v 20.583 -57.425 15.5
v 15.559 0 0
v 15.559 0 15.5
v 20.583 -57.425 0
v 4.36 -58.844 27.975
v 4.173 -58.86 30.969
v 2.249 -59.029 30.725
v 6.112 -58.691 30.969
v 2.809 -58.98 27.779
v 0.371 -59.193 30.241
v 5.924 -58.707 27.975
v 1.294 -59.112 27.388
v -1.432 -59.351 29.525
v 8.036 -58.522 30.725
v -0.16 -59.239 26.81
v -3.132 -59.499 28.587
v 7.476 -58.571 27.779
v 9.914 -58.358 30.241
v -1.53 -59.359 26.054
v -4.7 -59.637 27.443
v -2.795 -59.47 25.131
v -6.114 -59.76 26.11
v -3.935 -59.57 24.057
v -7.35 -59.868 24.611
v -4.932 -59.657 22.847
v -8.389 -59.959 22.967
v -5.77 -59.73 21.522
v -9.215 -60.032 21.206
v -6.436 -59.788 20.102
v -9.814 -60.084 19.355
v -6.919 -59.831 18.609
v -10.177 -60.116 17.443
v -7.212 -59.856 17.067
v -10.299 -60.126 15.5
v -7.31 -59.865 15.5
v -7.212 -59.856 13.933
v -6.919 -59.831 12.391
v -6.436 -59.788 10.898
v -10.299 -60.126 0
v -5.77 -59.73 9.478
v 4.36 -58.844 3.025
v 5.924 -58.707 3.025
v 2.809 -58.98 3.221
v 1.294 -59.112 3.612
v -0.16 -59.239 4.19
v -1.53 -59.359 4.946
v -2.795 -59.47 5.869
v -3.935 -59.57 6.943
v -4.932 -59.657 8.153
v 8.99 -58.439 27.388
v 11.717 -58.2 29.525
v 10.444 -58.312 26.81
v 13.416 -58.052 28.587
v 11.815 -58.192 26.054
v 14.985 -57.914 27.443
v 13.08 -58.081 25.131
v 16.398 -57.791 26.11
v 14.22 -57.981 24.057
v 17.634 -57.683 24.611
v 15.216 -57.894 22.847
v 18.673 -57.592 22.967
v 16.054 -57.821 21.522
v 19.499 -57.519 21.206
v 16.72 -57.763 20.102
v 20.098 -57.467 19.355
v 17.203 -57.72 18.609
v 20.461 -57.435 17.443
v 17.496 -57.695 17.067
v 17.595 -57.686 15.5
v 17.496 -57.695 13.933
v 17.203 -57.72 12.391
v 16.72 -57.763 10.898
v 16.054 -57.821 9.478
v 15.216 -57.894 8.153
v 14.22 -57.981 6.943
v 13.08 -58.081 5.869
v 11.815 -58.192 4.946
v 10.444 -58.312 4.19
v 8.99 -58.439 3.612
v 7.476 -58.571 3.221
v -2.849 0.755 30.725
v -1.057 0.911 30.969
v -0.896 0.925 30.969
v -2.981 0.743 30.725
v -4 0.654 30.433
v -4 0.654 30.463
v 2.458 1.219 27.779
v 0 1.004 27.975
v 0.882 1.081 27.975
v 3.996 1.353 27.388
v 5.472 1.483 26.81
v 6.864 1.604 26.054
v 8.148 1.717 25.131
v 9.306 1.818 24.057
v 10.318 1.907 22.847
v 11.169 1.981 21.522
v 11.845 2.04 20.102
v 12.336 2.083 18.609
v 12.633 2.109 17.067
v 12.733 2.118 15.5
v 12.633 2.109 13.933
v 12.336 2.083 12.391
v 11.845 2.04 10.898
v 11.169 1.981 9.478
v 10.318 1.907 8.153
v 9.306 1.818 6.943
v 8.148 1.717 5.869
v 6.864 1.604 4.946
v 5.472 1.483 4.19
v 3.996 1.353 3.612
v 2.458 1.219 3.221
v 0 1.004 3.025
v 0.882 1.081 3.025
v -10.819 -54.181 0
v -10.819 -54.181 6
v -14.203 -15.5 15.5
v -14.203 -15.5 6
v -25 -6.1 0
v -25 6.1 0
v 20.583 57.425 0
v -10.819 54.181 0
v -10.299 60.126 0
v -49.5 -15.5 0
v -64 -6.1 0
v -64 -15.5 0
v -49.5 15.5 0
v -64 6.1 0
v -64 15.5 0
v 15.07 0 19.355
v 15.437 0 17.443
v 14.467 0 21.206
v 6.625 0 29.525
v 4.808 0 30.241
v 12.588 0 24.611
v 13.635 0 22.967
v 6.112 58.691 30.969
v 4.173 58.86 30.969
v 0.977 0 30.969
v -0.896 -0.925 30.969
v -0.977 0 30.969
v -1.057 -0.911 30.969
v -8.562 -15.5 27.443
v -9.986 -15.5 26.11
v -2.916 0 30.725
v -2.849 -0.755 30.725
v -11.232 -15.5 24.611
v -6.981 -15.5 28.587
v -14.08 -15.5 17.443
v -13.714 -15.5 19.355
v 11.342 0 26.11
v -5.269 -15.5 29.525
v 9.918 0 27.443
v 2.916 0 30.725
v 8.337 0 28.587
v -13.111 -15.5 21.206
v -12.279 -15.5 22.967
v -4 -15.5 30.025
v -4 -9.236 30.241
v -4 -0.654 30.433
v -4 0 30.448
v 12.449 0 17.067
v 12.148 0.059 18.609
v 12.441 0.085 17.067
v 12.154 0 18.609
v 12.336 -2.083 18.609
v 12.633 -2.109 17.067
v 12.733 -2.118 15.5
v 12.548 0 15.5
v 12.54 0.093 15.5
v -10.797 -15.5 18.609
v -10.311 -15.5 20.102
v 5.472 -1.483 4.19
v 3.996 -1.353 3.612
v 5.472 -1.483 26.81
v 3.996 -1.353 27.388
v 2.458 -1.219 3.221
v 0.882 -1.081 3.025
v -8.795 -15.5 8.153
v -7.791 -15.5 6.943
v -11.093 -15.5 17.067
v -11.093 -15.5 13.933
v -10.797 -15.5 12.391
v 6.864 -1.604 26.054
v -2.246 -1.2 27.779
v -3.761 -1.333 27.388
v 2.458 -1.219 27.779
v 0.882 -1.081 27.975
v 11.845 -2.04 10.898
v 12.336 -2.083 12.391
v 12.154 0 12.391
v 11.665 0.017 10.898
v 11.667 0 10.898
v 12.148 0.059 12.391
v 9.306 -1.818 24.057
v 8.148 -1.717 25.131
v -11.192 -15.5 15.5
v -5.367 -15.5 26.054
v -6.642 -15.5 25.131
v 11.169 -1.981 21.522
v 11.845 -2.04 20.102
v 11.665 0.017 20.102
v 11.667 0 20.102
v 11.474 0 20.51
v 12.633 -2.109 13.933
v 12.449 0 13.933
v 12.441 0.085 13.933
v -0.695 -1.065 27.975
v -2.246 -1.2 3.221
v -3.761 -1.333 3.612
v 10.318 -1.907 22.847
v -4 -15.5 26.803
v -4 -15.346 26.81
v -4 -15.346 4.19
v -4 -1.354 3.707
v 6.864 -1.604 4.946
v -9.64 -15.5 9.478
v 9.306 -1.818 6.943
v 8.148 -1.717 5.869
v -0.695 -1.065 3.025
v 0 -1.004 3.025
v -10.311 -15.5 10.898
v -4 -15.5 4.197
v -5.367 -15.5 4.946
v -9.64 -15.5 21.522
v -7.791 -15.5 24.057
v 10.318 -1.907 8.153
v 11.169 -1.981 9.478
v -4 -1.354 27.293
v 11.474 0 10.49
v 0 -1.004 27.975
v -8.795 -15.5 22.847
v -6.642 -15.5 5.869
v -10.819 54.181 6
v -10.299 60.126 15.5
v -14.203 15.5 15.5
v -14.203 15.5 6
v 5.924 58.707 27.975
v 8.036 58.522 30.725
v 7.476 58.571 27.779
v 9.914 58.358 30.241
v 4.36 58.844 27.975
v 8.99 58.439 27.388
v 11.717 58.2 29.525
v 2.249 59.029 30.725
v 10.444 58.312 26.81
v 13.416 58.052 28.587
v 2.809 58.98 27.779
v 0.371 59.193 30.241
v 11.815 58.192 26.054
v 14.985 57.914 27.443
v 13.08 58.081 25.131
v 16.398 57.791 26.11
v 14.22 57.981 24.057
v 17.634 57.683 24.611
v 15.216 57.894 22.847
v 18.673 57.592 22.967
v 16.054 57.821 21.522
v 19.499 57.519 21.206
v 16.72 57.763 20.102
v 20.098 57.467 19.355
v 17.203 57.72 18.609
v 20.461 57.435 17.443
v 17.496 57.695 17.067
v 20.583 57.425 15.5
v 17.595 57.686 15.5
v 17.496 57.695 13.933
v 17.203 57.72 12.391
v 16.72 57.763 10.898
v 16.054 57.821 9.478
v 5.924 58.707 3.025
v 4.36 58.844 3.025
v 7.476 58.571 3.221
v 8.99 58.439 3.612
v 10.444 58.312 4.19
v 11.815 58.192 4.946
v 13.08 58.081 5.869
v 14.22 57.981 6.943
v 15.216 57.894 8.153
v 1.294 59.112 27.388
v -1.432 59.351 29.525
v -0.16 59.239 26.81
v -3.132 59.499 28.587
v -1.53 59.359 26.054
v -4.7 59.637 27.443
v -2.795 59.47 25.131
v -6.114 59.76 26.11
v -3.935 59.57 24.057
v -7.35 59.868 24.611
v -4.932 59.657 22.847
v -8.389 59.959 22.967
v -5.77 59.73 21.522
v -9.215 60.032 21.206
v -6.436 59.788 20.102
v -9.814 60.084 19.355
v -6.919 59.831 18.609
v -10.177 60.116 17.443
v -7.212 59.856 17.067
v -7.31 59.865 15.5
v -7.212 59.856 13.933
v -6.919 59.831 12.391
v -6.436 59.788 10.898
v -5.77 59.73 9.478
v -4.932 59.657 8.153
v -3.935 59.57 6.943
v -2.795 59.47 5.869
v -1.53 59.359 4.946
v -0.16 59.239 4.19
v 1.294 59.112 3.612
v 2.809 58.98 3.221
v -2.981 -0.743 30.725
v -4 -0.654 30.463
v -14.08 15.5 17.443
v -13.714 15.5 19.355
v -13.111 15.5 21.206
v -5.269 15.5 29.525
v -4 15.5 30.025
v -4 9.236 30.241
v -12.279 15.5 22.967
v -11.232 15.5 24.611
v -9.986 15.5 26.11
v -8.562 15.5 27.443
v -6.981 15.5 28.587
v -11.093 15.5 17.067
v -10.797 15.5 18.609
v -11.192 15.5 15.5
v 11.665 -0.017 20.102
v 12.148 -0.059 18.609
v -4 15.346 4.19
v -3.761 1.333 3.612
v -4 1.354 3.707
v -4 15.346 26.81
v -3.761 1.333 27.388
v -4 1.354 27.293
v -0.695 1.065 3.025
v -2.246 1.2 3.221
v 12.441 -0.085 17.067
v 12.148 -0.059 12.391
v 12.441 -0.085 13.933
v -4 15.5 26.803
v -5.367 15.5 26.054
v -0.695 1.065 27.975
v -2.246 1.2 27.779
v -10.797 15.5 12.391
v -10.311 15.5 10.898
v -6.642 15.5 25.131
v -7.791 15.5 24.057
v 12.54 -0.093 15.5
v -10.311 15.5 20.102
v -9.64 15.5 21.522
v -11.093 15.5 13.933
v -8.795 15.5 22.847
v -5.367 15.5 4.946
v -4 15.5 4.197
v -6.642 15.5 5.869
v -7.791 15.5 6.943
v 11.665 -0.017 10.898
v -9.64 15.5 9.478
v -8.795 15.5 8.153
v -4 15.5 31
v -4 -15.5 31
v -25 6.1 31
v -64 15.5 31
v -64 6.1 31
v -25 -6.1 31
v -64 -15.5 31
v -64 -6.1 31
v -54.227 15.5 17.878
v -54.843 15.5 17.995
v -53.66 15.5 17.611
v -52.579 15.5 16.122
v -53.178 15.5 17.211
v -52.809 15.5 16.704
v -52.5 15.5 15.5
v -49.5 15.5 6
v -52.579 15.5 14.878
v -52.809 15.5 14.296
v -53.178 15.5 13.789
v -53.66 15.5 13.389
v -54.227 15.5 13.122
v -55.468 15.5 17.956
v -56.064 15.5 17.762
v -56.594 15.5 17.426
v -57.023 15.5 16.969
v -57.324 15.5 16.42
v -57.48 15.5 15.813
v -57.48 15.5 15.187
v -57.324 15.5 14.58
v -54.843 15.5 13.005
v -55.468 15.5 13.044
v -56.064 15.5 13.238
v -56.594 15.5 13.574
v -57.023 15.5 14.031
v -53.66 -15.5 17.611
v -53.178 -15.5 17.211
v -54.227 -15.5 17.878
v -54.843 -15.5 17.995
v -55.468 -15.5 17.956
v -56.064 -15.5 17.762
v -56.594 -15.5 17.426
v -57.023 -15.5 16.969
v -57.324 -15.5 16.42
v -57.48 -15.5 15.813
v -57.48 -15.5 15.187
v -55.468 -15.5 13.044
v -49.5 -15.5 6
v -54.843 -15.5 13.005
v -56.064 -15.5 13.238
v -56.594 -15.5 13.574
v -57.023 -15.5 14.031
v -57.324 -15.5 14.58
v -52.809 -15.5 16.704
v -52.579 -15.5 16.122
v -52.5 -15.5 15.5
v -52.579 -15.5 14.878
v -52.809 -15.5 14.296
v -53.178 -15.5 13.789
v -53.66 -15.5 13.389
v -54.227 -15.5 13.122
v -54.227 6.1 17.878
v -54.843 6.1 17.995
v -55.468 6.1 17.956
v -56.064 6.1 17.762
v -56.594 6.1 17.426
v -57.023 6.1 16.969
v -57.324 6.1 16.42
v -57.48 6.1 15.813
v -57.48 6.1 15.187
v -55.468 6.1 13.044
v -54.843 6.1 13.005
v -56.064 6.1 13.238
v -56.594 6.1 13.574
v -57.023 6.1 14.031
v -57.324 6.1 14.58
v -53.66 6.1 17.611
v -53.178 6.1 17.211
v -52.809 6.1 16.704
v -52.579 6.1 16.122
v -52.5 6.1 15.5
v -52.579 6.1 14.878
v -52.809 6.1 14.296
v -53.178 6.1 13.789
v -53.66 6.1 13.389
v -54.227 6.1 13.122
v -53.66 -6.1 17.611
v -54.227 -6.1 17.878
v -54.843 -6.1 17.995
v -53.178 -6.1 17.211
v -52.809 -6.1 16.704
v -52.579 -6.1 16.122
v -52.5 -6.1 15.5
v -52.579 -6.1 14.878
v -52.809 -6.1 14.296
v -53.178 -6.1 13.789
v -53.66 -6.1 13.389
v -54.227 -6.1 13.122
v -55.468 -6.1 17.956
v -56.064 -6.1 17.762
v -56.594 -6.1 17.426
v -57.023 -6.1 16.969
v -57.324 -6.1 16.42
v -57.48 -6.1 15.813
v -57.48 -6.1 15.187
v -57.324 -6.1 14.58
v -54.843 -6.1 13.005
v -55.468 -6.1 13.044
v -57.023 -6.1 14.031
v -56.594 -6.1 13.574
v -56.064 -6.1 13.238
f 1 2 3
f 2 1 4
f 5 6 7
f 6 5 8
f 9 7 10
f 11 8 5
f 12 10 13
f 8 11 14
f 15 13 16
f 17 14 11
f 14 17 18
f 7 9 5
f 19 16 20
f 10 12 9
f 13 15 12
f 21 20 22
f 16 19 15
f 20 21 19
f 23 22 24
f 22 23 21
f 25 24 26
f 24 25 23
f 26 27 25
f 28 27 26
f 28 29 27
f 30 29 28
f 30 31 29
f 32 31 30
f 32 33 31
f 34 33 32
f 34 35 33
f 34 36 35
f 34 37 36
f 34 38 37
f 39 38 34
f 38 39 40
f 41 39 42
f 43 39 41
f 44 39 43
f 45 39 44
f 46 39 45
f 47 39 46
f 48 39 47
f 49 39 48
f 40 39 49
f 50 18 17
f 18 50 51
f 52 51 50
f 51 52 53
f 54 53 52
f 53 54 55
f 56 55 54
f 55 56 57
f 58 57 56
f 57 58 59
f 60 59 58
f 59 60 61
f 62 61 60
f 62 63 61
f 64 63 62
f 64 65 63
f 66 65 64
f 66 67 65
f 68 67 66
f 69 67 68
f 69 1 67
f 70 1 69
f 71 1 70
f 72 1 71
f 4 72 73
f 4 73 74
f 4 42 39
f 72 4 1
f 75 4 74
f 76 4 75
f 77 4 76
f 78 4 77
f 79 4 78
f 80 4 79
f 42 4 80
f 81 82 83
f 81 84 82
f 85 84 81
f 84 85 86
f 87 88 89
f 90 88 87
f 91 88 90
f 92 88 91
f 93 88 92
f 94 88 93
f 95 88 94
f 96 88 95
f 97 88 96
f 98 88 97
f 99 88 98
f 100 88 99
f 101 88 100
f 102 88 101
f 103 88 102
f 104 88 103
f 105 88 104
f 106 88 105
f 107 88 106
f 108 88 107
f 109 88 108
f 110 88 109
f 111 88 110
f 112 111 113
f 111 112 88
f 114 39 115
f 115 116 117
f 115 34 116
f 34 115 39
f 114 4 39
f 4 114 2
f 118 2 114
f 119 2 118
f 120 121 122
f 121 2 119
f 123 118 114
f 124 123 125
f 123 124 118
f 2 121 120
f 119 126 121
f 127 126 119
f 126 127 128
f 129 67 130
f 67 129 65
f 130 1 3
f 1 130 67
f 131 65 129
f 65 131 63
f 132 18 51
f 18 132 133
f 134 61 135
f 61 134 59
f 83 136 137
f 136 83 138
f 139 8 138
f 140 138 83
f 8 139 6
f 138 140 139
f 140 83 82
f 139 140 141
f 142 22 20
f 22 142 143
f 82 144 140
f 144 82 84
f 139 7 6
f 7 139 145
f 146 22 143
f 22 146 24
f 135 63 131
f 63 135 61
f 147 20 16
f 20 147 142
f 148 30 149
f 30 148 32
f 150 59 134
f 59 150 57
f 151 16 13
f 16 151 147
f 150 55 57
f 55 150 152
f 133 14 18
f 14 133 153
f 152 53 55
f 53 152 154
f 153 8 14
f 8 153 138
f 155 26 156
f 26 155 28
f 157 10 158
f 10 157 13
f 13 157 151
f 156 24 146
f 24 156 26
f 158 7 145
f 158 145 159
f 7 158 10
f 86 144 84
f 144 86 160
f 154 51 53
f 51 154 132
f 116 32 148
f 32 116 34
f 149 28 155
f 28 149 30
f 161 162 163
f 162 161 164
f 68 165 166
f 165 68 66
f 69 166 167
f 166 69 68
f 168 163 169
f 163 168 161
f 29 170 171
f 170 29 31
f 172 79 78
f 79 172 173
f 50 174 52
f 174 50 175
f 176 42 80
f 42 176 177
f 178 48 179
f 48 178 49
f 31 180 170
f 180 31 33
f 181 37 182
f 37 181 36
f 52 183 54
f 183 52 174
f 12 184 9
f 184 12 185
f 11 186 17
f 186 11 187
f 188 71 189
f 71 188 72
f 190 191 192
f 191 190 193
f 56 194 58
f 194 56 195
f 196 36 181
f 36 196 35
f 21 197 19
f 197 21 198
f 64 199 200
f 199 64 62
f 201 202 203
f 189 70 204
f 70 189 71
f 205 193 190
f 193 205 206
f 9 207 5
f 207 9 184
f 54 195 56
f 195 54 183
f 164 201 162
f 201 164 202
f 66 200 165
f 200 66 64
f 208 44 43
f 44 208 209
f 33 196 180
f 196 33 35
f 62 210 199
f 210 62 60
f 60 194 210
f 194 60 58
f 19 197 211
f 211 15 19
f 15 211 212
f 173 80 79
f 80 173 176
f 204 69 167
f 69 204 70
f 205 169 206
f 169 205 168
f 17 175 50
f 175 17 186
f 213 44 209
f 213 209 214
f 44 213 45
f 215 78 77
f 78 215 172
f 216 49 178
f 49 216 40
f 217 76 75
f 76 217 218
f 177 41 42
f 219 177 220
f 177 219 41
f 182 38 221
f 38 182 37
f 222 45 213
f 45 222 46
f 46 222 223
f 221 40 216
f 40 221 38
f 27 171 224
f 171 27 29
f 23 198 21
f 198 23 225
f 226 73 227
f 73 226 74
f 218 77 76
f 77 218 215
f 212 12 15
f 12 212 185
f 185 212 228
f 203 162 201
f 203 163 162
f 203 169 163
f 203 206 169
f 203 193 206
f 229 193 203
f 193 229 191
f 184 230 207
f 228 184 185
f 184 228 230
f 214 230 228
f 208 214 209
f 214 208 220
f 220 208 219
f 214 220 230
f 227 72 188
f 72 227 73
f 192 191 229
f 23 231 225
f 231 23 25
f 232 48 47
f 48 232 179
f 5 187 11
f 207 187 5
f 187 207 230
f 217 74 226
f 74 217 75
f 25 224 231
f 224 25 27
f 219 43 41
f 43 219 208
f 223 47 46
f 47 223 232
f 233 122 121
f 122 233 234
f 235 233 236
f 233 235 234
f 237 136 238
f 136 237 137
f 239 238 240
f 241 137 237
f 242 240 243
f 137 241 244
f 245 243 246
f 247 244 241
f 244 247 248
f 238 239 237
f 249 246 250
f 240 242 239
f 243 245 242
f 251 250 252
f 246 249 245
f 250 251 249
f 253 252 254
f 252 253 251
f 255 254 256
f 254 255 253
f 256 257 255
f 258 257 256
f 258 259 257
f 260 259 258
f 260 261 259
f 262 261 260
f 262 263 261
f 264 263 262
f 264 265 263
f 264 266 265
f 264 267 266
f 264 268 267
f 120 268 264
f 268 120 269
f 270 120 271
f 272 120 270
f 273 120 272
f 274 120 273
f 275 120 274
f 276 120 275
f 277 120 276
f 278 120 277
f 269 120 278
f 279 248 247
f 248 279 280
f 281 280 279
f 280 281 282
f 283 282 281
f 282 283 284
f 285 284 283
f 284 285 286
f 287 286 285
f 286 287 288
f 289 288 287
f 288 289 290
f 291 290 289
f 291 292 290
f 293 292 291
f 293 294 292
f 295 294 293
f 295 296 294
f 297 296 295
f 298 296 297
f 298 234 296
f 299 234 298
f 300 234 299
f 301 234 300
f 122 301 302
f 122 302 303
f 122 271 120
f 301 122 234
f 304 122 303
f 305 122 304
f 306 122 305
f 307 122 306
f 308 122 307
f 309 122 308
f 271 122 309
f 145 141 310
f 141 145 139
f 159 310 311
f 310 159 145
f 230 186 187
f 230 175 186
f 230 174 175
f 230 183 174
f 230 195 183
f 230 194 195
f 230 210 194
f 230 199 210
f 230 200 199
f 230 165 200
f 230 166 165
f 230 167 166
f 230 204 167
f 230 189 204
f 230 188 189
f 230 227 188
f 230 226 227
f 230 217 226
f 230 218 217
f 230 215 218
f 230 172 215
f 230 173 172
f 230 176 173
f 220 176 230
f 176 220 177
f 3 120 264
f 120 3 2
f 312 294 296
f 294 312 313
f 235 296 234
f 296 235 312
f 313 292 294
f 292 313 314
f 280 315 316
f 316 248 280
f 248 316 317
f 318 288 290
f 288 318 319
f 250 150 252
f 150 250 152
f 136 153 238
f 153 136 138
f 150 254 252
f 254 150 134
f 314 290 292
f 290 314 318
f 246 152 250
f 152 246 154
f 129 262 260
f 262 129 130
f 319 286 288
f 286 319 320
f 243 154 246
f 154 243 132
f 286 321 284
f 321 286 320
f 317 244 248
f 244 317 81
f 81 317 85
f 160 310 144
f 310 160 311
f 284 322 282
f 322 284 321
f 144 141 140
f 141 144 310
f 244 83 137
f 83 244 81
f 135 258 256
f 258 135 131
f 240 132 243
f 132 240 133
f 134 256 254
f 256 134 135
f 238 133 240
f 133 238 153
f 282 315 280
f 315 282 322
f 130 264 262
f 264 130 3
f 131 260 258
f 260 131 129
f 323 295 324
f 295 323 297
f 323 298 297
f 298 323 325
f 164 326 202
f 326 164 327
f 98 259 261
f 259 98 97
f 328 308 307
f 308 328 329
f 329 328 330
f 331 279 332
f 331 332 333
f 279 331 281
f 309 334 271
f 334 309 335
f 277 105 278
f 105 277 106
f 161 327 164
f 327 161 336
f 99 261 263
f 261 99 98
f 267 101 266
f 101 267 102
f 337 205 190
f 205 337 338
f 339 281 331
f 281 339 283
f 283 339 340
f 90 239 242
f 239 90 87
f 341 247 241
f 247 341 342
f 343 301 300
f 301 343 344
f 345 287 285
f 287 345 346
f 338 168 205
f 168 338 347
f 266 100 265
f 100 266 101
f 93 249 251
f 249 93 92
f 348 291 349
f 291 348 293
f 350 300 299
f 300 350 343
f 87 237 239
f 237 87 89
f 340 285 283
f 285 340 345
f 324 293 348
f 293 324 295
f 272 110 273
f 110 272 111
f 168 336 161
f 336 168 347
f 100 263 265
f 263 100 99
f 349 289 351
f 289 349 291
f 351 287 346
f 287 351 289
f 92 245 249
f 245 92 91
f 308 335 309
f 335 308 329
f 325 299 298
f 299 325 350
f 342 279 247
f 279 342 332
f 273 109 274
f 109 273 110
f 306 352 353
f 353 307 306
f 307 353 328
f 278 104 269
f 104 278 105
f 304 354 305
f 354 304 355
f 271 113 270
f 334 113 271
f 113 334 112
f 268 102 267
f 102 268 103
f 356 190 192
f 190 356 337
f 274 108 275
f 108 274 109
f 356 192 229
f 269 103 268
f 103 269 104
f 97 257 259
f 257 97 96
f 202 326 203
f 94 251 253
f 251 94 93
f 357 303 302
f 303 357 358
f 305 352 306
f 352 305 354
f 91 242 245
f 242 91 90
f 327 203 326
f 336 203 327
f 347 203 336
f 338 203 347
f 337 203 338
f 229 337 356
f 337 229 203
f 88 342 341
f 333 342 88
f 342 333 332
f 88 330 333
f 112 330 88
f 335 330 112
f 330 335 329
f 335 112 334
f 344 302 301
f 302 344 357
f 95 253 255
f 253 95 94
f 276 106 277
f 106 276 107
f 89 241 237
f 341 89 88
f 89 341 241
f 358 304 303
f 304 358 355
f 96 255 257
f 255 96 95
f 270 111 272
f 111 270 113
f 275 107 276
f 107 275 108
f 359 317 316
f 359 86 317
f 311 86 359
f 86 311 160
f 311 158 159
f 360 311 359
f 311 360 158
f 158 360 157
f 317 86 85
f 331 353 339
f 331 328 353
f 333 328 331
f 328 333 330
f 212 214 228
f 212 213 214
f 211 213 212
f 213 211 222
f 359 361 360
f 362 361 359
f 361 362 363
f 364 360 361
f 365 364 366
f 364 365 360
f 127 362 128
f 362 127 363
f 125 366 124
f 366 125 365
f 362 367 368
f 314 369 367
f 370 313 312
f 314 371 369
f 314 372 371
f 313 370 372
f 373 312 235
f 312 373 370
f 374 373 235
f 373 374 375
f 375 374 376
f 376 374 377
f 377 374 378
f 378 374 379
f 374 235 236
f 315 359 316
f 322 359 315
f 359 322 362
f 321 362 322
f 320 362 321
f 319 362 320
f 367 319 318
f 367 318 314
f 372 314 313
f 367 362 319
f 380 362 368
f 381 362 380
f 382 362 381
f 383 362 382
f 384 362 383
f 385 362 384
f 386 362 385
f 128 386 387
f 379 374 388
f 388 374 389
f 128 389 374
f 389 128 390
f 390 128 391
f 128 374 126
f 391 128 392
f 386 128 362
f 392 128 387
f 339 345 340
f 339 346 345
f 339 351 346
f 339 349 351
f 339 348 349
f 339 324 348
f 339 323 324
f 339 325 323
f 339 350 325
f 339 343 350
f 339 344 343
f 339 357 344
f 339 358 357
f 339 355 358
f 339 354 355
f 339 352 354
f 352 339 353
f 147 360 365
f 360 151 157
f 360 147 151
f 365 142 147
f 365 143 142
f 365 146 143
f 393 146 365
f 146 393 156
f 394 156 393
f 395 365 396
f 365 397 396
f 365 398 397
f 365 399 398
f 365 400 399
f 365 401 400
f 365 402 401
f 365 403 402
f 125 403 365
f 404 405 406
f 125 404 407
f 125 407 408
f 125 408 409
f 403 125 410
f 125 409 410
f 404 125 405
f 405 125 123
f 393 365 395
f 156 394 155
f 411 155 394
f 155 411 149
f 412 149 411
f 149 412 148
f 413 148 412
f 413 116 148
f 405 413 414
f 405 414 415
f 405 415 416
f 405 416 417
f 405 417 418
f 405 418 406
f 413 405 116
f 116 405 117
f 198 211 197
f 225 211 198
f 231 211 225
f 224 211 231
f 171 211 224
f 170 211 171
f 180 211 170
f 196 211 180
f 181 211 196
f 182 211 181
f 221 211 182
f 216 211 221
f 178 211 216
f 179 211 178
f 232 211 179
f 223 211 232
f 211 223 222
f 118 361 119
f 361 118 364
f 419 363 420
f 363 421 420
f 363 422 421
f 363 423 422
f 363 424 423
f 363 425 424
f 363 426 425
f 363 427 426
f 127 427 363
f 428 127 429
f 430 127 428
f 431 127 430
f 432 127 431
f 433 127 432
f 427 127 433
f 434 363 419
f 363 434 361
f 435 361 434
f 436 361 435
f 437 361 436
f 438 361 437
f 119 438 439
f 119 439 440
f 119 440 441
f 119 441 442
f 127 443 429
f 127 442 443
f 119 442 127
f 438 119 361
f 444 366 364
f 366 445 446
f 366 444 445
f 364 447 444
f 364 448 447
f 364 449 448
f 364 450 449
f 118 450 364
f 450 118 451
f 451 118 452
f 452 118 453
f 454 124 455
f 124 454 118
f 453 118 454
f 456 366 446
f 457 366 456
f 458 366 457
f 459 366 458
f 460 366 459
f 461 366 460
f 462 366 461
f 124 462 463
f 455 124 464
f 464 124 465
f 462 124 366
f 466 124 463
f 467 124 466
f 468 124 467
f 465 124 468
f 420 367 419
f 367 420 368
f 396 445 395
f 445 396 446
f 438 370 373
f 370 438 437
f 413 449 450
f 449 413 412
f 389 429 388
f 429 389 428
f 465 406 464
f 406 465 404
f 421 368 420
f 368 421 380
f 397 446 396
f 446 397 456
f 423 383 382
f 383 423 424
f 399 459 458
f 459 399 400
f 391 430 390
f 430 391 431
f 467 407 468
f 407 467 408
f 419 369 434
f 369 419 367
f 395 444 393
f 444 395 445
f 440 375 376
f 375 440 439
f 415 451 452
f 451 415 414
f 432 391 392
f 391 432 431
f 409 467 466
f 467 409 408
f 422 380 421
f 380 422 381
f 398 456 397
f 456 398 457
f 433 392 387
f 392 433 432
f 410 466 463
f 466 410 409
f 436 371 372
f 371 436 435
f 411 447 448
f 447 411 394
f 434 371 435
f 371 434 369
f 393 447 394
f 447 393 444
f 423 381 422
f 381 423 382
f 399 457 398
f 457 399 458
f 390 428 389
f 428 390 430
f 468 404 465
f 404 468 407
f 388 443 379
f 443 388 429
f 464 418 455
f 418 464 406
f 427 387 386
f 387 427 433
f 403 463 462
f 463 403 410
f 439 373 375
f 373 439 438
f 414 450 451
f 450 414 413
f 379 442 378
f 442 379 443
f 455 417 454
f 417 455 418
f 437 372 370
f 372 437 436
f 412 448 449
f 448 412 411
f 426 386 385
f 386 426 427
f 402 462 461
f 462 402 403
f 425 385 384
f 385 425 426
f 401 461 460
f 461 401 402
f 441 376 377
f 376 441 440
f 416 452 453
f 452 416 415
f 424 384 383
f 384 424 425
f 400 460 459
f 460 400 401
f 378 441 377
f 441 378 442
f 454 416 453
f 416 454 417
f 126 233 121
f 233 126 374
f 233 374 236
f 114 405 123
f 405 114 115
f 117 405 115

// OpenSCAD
//Polargraph Board Feet
//Copyright Mark Benson 2016 CCNC 2016

module cap()
{
    rotate([90,0,0])
    difference()
    {
        union()
        {
            translate([0,(31/2)/2,0])
            cube([31,31/2,60], center=true);
    
            translate([0,31/2,0])
            cylinder(r=31/2, h=60, $fn=50, center=true);
        }
        
        union()
        {
            translate([0,31/2,1])
            cylinder(r=25/2, h=58, $fn=50, center=true);        
        }
    }
}

//Side strengthening rib
module strengtheningRib()
{
polyhedron(
  points=[ [0,0,0],[3,0,0],[3,10,0],[0,10,0],[0,10,10],[3,10,10]  ],
  faces=[ [0,1,3],[1,2,3],[0,3,4],[0,4,1],[1,4,5],[1,5,2],[2,5,4],[2,4,3] ]
 );
}

difference()
{
    union()
    {
        rotate([0,0,5])
        translate([0,-29,0])
        cap();
        
        rotate([0,0,-5-180])
        translate([0,-29,0])
        cap();
        
        translate([-34,0,31/2])
        cube([60,31,31], center=true);
    }

    union()
    {
        translate([-60,0,31/2])
        cube([70,12.2,31], center=true);

        translate([-55,50,31/2])
        rotate([90,0,0])
        cylinder(r=5/2, h=100, $fn=25);
    }
}

translate([-10,55,6])
rotate([0,90,180])
scale([2,4,4])
strengtheningRib();

mirror([0,1,0])
translate([-10,55,6])
rotate([0,90,180])
scale([2,4,4])
strengtheningRib();
